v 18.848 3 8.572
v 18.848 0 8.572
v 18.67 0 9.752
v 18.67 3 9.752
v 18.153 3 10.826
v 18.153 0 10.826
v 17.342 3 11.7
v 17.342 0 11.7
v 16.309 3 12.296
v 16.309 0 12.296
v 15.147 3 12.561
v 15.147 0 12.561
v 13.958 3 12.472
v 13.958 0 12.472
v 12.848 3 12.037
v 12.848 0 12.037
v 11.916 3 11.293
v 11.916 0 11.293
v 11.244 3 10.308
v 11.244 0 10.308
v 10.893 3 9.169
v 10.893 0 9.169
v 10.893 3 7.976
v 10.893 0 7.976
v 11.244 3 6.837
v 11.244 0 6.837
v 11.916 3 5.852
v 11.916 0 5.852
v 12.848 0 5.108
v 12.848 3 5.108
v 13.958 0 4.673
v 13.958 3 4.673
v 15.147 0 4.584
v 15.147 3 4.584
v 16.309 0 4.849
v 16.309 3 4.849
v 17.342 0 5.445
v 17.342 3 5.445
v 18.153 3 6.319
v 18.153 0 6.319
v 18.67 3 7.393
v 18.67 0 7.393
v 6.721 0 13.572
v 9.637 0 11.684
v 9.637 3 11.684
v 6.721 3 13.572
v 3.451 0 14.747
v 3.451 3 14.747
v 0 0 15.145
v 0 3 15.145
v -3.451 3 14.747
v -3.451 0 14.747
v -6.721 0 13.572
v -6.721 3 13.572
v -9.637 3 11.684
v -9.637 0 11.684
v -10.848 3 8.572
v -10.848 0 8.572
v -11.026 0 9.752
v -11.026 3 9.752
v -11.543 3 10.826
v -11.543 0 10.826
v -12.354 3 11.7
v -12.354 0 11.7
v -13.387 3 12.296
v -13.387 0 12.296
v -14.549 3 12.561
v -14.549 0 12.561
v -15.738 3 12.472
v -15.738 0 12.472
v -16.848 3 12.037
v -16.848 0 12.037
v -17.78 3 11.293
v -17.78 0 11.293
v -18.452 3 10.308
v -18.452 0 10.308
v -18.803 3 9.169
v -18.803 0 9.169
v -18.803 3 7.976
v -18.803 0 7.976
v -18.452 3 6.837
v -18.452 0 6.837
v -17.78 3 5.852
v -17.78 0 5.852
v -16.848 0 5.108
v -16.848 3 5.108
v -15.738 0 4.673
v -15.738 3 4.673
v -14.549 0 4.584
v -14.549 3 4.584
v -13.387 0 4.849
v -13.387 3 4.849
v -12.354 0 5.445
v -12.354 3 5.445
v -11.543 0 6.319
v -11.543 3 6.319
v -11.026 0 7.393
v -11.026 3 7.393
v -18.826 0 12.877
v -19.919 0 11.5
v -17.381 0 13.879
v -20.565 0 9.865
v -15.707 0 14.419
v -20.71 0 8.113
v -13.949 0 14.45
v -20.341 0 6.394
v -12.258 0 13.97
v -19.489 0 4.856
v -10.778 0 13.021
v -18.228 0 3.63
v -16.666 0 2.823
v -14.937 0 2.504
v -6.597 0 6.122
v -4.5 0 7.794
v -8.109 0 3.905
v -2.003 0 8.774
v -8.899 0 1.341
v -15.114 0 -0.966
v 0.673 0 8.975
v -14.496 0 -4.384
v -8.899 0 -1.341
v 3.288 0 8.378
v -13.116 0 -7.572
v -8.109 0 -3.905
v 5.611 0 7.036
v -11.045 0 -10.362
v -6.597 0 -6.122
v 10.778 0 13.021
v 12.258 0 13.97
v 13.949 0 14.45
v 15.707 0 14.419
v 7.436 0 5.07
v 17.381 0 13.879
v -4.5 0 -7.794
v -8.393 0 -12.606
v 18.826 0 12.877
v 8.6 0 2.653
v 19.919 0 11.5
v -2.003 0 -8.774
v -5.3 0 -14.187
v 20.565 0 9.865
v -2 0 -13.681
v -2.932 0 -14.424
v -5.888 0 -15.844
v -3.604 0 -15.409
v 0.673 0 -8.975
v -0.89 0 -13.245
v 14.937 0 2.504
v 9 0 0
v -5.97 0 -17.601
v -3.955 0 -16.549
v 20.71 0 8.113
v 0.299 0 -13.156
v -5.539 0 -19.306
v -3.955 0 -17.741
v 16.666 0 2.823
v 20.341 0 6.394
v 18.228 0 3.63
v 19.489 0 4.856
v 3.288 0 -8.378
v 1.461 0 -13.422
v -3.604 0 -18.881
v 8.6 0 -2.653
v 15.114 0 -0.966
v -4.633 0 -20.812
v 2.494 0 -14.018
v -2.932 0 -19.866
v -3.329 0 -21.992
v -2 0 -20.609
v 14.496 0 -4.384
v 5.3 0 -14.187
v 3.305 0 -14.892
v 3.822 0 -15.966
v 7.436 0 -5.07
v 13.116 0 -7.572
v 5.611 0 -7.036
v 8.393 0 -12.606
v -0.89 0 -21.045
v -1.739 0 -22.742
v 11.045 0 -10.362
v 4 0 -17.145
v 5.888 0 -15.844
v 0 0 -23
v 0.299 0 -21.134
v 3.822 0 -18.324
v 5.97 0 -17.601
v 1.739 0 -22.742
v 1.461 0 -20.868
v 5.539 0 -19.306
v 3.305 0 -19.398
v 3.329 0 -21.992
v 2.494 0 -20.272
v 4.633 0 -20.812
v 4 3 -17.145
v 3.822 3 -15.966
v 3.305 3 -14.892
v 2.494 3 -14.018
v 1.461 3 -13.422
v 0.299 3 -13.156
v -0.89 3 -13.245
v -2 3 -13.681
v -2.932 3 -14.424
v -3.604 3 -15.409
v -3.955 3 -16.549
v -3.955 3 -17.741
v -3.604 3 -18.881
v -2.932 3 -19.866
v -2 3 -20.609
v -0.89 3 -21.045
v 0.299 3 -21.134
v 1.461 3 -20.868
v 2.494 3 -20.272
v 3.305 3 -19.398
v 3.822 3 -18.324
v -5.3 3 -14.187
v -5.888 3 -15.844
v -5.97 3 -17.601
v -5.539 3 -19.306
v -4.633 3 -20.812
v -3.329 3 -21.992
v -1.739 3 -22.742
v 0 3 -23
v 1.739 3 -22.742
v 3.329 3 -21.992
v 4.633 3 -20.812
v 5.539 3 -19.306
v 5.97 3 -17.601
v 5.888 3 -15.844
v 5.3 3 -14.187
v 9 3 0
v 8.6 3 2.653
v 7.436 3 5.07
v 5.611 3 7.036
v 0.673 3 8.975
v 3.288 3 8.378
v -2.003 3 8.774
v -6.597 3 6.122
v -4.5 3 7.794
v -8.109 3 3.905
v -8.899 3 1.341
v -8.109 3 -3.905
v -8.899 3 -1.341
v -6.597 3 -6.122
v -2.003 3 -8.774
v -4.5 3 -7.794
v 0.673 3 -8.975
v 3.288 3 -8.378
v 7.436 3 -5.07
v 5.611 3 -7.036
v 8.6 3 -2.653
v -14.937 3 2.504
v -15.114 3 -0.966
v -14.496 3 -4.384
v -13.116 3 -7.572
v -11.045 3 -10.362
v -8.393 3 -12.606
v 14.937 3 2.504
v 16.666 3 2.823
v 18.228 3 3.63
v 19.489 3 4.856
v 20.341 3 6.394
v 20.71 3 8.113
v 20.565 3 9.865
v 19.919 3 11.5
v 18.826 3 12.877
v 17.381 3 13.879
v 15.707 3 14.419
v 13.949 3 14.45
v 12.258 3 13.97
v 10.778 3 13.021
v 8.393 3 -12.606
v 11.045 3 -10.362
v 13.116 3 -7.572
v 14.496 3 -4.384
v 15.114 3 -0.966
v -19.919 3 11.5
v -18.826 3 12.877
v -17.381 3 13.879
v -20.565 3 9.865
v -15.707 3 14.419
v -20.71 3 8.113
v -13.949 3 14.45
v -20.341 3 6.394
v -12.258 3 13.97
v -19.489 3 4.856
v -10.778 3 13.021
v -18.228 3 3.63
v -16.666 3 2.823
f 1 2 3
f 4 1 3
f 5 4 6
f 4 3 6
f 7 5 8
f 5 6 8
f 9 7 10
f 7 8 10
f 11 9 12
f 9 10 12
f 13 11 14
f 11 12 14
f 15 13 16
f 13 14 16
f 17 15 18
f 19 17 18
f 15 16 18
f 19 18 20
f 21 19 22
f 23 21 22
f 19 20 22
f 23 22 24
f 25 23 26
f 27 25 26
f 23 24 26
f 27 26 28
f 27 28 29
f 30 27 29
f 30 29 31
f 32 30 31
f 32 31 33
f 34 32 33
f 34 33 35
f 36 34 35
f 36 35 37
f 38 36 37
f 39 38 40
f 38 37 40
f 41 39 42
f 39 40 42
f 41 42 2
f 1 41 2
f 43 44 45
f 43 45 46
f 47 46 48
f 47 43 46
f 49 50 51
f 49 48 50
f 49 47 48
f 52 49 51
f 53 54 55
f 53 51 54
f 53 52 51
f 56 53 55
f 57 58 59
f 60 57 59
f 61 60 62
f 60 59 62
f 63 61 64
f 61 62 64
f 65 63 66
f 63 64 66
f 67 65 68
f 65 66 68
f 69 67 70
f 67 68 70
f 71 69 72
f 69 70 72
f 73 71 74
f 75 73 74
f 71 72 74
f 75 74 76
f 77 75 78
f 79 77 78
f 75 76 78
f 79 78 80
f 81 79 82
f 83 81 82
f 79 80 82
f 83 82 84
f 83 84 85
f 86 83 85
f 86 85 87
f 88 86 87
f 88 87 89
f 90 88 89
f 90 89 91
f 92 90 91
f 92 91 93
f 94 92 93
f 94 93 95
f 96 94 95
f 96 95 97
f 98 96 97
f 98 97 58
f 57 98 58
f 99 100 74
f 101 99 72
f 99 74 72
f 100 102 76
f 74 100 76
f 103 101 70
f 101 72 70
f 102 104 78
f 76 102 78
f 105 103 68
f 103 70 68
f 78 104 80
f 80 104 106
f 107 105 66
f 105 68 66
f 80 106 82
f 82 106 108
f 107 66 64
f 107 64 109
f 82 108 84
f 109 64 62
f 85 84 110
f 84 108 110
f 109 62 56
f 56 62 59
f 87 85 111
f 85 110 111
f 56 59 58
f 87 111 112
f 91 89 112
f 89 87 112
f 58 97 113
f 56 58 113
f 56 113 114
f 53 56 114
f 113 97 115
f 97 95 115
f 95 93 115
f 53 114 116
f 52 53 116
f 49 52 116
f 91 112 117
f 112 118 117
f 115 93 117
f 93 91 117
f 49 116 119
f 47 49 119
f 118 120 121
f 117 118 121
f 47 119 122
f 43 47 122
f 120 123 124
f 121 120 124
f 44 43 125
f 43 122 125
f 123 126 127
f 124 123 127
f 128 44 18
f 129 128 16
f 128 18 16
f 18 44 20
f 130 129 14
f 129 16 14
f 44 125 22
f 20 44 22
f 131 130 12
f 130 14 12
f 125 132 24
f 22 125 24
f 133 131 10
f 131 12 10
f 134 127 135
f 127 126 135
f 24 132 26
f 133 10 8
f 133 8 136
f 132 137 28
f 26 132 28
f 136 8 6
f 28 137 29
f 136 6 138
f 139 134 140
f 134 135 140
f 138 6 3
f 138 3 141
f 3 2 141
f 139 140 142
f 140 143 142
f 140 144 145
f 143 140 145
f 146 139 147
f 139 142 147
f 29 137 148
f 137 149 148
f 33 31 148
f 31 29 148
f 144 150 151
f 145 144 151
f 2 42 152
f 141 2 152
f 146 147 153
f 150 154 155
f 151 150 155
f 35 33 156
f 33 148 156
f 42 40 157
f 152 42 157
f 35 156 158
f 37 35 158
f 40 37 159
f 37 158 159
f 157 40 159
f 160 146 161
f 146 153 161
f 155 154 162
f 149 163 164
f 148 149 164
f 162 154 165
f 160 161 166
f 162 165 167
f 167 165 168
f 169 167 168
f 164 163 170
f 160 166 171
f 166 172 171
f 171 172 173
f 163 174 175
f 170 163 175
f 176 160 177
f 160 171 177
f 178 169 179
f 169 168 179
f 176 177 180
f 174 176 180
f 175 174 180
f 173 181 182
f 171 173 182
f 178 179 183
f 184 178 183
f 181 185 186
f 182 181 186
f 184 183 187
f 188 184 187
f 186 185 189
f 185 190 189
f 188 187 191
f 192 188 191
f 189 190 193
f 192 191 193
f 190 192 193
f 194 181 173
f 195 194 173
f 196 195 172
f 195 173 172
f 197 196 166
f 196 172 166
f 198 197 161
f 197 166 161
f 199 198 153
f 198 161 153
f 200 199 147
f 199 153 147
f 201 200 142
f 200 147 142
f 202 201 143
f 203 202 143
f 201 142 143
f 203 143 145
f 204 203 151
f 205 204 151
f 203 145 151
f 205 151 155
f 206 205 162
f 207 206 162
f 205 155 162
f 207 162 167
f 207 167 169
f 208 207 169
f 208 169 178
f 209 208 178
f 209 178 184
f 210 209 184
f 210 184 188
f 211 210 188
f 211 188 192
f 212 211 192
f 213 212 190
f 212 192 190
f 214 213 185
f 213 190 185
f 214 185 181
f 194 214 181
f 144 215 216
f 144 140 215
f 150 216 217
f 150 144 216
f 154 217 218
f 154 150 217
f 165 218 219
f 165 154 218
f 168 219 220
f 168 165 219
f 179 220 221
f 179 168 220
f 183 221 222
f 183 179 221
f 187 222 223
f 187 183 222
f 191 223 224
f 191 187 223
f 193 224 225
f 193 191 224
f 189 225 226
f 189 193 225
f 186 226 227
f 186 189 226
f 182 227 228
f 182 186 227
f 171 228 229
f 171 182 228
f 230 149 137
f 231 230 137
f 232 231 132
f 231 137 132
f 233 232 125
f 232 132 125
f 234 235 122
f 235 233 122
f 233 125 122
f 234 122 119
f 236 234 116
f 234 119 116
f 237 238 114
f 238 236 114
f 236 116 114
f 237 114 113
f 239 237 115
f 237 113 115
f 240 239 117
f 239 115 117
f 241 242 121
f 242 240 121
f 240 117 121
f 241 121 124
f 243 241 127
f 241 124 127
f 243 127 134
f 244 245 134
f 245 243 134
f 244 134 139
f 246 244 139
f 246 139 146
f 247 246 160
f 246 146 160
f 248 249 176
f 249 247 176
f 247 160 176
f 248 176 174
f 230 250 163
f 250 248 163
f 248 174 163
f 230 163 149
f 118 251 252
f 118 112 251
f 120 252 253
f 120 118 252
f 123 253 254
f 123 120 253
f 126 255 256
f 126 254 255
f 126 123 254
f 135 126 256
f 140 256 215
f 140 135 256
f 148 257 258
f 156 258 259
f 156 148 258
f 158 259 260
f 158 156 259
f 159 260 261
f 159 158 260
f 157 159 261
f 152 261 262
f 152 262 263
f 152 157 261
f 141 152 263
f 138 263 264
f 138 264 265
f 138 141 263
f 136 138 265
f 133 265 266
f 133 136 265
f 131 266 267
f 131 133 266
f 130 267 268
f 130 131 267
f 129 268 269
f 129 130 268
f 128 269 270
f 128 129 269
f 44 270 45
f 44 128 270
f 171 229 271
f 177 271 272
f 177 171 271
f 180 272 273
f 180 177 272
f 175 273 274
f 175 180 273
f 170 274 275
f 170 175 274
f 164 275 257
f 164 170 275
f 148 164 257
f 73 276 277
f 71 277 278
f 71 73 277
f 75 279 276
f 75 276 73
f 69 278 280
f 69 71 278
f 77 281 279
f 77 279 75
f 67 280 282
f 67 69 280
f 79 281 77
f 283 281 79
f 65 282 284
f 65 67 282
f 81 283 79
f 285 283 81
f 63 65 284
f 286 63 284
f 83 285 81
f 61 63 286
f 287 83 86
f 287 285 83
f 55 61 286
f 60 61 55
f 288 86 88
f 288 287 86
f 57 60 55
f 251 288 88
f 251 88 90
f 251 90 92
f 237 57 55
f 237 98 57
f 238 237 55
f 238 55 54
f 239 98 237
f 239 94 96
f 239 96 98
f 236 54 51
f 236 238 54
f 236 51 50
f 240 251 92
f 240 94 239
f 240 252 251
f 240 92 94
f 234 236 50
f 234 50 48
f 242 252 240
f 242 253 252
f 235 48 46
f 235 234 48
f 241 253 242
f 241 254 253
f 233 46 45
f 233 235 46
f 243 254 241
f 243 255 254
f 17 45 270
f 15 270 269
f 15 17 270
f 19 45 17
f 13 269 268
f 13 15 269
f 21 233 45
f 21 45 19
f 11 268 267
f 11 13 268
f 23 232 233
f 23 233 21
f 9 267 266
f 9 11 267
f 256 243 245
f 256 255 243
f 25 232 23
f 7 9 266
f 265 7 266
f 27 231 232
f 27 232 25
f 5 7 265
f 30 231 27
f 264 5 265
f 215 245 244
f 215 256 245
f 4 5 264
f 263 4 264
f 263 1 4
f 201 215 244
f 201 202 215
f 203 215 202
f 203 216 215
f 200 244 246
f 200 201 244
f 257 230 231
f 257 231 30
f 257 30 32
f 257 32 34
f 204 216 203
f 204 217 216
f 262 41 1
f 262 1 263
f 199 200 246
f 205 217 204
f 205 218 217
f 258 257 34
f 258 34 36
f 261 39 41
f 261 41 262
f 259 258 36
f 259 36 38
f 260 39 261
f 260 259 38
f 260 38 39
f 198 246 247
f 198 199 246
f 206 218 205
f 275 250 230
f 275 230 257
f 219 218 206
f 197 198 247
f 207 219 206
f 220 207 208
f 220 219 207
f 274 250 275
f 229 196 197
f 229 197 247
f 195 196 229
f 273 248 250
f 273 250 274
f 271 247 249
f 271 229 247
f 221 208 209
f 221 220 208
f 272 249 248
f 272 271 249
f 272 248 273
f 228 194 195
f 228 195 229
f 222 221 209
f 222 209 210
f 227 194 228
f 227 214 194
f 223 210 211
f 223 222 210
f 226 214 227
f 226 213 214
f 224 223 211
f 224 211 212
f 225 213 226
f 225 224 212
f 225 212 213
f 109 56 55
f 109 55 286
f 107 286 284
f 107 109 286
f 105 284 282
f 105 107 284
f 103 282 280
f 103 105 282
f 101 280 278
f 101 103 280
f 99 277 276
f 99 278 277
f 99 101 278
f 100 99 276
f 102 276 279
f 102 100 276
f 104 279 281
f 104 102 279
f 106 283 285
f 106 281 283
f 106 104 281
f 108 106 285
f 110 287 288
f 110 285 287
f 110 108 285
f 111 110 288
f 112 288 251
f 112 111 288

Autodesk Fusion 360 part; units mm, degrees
sketch "Sketch1" plane through (0, 0, 0) normal (0, 1, 0) x (1, 0, 0)
  circle A0 centre (0, 0) radius 15.145
  circle A1 centre (0, 17.145) radius 4
  circle A2 centre (-14.848, -8.5725) radius 4
  circle A3 centre (14.848, -8.5725) radius 4
  circle A4 centre (0, 0) radius 9
  circle A5 centre (0, 17) radius 6
  circle A6 centre (-14.7224, -8.5) radius 6
  circle A7 centre (14.7224, -8.5) radius 6
  dimension "d3" = 30.29
  dimension "d4" = 8
  dimension "d7" = 18
  dimension "d9" = 360
extrude "Extrude1" add sketch "Sketch1" along normal blind 3 contours A0 A5 A6 A7 | A0 A1 A5 | A0 A1 A5 | A0 A3 A7 | A0 A3 A7 | A0 A2 A6 | A0 A2 A6
